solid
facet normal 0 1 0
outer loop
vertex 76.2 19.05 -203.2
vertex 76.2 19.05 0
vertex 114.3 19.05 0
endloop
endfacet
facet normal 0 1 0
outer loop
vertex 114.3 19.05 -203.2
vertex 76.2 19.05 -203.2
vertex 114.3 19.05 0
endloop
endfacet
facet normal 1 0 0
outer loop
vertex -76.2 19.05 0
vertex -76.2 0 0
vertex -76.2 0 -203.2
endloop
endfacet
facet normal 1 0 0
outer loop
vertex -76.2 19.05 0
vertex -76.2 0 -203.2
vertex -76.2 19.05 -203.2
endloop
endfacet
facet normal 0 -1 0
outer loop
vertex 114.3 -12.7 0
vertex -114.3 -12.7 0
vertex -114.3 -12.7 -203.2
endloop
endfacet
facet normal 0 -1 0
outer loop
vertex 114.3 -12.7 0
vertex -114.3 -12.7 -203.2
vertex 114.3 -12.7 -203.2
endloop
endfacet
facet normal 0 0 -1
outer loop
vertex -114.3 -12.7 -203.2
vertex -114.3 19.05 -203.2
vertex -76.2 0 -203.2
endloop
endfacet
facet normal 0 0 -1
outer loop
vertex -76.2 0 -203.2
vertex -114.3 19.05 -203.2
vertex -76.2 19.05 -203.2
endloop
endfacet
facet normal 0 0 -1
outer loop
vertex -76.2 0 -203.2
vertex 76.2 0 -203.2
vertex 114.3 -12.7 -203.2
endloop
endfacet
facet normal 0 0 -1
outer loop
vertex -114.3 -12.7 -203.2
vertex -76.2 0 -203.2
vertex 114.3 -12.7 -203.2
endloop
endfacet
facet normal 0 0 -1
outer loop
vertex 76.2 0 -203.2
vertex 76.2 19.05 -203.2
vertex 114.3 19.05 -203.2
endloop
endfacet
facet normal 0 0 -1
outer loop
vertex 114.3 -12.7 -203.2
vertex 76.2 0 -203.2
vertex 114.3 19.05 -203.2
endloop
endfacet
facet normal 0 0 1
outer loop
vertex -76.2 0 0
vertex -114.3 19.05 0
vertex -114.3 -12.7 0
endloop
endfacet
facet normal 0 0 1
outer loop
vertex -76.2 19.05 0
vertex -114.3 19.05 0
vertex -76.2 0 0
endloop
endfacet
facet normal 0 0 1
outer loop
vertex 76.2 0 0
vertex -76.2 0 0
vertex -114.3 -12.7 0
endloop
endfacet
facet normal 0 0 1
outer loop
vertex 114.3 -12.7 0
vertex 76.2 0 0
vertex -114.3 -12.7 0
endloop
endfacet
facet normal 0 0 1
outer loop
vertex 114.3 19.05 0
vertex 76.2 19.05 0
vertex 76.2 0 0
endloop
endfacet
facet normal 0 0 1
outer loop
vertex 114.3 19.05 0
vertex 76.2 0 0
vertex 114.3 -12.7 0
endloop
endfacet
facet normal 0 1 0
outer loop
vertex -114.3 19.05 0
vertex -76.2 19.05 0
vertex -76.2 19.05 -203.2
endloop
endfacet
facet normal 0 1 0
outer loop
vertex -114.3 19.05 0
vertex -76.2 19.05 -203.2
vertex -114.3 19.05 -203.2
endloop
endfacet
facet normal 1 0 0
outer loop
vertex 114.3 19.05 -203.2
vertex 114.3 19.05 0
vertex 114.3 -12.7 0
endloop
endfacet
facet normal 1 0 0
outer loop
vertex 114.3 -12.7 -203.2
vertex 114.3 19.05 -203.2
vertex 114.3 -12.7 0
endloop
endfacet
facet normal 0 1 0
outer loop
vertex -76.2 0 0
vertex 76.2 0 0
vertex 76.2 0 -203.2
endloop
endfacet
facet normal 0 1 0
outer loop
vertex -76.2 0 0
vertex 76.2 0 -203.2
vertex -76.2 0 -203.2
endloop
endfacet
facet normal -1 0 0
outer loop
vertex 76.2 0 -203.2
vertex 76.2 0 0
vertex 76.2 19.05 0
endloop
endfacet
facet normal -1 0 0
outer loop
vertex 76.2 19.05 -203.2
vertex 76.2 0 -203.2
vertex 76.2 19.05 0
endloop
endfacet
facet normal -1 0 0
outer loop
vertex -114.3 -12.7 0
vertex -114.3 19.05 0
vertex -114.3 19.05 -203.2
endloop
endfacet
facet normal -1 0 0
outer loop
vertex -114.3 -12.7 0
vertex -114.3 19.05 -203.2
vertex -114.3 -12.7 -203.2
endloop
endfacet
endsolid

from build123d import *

# Parameters (mm, degrees)
BOSS_EXTRUDE1_DEPTH = 203.2


with BuildPart() as part:
    # Sketch1 → Boss-Extrude1 (new body)
    with BuildSketch(Plane.XY):
        Polygon((0, 0), (76.2, 0), (76.2, 19.05), (114.3, 19.05), (114.3, -12.7), (0, -12.7), align=None)
    boss_extrude1 = extrude(amount=-BOSS_EXTRUDE1_DEPTH)

    # Mirror1: Boss-Extrude1 across plane
    add(boss_extrude1.mirror(Plane(origin=(0, -12.7, -203.2), x_dir=(0, 0, 1), z_dir=(-1, 0, 0))))


solid = part.part
